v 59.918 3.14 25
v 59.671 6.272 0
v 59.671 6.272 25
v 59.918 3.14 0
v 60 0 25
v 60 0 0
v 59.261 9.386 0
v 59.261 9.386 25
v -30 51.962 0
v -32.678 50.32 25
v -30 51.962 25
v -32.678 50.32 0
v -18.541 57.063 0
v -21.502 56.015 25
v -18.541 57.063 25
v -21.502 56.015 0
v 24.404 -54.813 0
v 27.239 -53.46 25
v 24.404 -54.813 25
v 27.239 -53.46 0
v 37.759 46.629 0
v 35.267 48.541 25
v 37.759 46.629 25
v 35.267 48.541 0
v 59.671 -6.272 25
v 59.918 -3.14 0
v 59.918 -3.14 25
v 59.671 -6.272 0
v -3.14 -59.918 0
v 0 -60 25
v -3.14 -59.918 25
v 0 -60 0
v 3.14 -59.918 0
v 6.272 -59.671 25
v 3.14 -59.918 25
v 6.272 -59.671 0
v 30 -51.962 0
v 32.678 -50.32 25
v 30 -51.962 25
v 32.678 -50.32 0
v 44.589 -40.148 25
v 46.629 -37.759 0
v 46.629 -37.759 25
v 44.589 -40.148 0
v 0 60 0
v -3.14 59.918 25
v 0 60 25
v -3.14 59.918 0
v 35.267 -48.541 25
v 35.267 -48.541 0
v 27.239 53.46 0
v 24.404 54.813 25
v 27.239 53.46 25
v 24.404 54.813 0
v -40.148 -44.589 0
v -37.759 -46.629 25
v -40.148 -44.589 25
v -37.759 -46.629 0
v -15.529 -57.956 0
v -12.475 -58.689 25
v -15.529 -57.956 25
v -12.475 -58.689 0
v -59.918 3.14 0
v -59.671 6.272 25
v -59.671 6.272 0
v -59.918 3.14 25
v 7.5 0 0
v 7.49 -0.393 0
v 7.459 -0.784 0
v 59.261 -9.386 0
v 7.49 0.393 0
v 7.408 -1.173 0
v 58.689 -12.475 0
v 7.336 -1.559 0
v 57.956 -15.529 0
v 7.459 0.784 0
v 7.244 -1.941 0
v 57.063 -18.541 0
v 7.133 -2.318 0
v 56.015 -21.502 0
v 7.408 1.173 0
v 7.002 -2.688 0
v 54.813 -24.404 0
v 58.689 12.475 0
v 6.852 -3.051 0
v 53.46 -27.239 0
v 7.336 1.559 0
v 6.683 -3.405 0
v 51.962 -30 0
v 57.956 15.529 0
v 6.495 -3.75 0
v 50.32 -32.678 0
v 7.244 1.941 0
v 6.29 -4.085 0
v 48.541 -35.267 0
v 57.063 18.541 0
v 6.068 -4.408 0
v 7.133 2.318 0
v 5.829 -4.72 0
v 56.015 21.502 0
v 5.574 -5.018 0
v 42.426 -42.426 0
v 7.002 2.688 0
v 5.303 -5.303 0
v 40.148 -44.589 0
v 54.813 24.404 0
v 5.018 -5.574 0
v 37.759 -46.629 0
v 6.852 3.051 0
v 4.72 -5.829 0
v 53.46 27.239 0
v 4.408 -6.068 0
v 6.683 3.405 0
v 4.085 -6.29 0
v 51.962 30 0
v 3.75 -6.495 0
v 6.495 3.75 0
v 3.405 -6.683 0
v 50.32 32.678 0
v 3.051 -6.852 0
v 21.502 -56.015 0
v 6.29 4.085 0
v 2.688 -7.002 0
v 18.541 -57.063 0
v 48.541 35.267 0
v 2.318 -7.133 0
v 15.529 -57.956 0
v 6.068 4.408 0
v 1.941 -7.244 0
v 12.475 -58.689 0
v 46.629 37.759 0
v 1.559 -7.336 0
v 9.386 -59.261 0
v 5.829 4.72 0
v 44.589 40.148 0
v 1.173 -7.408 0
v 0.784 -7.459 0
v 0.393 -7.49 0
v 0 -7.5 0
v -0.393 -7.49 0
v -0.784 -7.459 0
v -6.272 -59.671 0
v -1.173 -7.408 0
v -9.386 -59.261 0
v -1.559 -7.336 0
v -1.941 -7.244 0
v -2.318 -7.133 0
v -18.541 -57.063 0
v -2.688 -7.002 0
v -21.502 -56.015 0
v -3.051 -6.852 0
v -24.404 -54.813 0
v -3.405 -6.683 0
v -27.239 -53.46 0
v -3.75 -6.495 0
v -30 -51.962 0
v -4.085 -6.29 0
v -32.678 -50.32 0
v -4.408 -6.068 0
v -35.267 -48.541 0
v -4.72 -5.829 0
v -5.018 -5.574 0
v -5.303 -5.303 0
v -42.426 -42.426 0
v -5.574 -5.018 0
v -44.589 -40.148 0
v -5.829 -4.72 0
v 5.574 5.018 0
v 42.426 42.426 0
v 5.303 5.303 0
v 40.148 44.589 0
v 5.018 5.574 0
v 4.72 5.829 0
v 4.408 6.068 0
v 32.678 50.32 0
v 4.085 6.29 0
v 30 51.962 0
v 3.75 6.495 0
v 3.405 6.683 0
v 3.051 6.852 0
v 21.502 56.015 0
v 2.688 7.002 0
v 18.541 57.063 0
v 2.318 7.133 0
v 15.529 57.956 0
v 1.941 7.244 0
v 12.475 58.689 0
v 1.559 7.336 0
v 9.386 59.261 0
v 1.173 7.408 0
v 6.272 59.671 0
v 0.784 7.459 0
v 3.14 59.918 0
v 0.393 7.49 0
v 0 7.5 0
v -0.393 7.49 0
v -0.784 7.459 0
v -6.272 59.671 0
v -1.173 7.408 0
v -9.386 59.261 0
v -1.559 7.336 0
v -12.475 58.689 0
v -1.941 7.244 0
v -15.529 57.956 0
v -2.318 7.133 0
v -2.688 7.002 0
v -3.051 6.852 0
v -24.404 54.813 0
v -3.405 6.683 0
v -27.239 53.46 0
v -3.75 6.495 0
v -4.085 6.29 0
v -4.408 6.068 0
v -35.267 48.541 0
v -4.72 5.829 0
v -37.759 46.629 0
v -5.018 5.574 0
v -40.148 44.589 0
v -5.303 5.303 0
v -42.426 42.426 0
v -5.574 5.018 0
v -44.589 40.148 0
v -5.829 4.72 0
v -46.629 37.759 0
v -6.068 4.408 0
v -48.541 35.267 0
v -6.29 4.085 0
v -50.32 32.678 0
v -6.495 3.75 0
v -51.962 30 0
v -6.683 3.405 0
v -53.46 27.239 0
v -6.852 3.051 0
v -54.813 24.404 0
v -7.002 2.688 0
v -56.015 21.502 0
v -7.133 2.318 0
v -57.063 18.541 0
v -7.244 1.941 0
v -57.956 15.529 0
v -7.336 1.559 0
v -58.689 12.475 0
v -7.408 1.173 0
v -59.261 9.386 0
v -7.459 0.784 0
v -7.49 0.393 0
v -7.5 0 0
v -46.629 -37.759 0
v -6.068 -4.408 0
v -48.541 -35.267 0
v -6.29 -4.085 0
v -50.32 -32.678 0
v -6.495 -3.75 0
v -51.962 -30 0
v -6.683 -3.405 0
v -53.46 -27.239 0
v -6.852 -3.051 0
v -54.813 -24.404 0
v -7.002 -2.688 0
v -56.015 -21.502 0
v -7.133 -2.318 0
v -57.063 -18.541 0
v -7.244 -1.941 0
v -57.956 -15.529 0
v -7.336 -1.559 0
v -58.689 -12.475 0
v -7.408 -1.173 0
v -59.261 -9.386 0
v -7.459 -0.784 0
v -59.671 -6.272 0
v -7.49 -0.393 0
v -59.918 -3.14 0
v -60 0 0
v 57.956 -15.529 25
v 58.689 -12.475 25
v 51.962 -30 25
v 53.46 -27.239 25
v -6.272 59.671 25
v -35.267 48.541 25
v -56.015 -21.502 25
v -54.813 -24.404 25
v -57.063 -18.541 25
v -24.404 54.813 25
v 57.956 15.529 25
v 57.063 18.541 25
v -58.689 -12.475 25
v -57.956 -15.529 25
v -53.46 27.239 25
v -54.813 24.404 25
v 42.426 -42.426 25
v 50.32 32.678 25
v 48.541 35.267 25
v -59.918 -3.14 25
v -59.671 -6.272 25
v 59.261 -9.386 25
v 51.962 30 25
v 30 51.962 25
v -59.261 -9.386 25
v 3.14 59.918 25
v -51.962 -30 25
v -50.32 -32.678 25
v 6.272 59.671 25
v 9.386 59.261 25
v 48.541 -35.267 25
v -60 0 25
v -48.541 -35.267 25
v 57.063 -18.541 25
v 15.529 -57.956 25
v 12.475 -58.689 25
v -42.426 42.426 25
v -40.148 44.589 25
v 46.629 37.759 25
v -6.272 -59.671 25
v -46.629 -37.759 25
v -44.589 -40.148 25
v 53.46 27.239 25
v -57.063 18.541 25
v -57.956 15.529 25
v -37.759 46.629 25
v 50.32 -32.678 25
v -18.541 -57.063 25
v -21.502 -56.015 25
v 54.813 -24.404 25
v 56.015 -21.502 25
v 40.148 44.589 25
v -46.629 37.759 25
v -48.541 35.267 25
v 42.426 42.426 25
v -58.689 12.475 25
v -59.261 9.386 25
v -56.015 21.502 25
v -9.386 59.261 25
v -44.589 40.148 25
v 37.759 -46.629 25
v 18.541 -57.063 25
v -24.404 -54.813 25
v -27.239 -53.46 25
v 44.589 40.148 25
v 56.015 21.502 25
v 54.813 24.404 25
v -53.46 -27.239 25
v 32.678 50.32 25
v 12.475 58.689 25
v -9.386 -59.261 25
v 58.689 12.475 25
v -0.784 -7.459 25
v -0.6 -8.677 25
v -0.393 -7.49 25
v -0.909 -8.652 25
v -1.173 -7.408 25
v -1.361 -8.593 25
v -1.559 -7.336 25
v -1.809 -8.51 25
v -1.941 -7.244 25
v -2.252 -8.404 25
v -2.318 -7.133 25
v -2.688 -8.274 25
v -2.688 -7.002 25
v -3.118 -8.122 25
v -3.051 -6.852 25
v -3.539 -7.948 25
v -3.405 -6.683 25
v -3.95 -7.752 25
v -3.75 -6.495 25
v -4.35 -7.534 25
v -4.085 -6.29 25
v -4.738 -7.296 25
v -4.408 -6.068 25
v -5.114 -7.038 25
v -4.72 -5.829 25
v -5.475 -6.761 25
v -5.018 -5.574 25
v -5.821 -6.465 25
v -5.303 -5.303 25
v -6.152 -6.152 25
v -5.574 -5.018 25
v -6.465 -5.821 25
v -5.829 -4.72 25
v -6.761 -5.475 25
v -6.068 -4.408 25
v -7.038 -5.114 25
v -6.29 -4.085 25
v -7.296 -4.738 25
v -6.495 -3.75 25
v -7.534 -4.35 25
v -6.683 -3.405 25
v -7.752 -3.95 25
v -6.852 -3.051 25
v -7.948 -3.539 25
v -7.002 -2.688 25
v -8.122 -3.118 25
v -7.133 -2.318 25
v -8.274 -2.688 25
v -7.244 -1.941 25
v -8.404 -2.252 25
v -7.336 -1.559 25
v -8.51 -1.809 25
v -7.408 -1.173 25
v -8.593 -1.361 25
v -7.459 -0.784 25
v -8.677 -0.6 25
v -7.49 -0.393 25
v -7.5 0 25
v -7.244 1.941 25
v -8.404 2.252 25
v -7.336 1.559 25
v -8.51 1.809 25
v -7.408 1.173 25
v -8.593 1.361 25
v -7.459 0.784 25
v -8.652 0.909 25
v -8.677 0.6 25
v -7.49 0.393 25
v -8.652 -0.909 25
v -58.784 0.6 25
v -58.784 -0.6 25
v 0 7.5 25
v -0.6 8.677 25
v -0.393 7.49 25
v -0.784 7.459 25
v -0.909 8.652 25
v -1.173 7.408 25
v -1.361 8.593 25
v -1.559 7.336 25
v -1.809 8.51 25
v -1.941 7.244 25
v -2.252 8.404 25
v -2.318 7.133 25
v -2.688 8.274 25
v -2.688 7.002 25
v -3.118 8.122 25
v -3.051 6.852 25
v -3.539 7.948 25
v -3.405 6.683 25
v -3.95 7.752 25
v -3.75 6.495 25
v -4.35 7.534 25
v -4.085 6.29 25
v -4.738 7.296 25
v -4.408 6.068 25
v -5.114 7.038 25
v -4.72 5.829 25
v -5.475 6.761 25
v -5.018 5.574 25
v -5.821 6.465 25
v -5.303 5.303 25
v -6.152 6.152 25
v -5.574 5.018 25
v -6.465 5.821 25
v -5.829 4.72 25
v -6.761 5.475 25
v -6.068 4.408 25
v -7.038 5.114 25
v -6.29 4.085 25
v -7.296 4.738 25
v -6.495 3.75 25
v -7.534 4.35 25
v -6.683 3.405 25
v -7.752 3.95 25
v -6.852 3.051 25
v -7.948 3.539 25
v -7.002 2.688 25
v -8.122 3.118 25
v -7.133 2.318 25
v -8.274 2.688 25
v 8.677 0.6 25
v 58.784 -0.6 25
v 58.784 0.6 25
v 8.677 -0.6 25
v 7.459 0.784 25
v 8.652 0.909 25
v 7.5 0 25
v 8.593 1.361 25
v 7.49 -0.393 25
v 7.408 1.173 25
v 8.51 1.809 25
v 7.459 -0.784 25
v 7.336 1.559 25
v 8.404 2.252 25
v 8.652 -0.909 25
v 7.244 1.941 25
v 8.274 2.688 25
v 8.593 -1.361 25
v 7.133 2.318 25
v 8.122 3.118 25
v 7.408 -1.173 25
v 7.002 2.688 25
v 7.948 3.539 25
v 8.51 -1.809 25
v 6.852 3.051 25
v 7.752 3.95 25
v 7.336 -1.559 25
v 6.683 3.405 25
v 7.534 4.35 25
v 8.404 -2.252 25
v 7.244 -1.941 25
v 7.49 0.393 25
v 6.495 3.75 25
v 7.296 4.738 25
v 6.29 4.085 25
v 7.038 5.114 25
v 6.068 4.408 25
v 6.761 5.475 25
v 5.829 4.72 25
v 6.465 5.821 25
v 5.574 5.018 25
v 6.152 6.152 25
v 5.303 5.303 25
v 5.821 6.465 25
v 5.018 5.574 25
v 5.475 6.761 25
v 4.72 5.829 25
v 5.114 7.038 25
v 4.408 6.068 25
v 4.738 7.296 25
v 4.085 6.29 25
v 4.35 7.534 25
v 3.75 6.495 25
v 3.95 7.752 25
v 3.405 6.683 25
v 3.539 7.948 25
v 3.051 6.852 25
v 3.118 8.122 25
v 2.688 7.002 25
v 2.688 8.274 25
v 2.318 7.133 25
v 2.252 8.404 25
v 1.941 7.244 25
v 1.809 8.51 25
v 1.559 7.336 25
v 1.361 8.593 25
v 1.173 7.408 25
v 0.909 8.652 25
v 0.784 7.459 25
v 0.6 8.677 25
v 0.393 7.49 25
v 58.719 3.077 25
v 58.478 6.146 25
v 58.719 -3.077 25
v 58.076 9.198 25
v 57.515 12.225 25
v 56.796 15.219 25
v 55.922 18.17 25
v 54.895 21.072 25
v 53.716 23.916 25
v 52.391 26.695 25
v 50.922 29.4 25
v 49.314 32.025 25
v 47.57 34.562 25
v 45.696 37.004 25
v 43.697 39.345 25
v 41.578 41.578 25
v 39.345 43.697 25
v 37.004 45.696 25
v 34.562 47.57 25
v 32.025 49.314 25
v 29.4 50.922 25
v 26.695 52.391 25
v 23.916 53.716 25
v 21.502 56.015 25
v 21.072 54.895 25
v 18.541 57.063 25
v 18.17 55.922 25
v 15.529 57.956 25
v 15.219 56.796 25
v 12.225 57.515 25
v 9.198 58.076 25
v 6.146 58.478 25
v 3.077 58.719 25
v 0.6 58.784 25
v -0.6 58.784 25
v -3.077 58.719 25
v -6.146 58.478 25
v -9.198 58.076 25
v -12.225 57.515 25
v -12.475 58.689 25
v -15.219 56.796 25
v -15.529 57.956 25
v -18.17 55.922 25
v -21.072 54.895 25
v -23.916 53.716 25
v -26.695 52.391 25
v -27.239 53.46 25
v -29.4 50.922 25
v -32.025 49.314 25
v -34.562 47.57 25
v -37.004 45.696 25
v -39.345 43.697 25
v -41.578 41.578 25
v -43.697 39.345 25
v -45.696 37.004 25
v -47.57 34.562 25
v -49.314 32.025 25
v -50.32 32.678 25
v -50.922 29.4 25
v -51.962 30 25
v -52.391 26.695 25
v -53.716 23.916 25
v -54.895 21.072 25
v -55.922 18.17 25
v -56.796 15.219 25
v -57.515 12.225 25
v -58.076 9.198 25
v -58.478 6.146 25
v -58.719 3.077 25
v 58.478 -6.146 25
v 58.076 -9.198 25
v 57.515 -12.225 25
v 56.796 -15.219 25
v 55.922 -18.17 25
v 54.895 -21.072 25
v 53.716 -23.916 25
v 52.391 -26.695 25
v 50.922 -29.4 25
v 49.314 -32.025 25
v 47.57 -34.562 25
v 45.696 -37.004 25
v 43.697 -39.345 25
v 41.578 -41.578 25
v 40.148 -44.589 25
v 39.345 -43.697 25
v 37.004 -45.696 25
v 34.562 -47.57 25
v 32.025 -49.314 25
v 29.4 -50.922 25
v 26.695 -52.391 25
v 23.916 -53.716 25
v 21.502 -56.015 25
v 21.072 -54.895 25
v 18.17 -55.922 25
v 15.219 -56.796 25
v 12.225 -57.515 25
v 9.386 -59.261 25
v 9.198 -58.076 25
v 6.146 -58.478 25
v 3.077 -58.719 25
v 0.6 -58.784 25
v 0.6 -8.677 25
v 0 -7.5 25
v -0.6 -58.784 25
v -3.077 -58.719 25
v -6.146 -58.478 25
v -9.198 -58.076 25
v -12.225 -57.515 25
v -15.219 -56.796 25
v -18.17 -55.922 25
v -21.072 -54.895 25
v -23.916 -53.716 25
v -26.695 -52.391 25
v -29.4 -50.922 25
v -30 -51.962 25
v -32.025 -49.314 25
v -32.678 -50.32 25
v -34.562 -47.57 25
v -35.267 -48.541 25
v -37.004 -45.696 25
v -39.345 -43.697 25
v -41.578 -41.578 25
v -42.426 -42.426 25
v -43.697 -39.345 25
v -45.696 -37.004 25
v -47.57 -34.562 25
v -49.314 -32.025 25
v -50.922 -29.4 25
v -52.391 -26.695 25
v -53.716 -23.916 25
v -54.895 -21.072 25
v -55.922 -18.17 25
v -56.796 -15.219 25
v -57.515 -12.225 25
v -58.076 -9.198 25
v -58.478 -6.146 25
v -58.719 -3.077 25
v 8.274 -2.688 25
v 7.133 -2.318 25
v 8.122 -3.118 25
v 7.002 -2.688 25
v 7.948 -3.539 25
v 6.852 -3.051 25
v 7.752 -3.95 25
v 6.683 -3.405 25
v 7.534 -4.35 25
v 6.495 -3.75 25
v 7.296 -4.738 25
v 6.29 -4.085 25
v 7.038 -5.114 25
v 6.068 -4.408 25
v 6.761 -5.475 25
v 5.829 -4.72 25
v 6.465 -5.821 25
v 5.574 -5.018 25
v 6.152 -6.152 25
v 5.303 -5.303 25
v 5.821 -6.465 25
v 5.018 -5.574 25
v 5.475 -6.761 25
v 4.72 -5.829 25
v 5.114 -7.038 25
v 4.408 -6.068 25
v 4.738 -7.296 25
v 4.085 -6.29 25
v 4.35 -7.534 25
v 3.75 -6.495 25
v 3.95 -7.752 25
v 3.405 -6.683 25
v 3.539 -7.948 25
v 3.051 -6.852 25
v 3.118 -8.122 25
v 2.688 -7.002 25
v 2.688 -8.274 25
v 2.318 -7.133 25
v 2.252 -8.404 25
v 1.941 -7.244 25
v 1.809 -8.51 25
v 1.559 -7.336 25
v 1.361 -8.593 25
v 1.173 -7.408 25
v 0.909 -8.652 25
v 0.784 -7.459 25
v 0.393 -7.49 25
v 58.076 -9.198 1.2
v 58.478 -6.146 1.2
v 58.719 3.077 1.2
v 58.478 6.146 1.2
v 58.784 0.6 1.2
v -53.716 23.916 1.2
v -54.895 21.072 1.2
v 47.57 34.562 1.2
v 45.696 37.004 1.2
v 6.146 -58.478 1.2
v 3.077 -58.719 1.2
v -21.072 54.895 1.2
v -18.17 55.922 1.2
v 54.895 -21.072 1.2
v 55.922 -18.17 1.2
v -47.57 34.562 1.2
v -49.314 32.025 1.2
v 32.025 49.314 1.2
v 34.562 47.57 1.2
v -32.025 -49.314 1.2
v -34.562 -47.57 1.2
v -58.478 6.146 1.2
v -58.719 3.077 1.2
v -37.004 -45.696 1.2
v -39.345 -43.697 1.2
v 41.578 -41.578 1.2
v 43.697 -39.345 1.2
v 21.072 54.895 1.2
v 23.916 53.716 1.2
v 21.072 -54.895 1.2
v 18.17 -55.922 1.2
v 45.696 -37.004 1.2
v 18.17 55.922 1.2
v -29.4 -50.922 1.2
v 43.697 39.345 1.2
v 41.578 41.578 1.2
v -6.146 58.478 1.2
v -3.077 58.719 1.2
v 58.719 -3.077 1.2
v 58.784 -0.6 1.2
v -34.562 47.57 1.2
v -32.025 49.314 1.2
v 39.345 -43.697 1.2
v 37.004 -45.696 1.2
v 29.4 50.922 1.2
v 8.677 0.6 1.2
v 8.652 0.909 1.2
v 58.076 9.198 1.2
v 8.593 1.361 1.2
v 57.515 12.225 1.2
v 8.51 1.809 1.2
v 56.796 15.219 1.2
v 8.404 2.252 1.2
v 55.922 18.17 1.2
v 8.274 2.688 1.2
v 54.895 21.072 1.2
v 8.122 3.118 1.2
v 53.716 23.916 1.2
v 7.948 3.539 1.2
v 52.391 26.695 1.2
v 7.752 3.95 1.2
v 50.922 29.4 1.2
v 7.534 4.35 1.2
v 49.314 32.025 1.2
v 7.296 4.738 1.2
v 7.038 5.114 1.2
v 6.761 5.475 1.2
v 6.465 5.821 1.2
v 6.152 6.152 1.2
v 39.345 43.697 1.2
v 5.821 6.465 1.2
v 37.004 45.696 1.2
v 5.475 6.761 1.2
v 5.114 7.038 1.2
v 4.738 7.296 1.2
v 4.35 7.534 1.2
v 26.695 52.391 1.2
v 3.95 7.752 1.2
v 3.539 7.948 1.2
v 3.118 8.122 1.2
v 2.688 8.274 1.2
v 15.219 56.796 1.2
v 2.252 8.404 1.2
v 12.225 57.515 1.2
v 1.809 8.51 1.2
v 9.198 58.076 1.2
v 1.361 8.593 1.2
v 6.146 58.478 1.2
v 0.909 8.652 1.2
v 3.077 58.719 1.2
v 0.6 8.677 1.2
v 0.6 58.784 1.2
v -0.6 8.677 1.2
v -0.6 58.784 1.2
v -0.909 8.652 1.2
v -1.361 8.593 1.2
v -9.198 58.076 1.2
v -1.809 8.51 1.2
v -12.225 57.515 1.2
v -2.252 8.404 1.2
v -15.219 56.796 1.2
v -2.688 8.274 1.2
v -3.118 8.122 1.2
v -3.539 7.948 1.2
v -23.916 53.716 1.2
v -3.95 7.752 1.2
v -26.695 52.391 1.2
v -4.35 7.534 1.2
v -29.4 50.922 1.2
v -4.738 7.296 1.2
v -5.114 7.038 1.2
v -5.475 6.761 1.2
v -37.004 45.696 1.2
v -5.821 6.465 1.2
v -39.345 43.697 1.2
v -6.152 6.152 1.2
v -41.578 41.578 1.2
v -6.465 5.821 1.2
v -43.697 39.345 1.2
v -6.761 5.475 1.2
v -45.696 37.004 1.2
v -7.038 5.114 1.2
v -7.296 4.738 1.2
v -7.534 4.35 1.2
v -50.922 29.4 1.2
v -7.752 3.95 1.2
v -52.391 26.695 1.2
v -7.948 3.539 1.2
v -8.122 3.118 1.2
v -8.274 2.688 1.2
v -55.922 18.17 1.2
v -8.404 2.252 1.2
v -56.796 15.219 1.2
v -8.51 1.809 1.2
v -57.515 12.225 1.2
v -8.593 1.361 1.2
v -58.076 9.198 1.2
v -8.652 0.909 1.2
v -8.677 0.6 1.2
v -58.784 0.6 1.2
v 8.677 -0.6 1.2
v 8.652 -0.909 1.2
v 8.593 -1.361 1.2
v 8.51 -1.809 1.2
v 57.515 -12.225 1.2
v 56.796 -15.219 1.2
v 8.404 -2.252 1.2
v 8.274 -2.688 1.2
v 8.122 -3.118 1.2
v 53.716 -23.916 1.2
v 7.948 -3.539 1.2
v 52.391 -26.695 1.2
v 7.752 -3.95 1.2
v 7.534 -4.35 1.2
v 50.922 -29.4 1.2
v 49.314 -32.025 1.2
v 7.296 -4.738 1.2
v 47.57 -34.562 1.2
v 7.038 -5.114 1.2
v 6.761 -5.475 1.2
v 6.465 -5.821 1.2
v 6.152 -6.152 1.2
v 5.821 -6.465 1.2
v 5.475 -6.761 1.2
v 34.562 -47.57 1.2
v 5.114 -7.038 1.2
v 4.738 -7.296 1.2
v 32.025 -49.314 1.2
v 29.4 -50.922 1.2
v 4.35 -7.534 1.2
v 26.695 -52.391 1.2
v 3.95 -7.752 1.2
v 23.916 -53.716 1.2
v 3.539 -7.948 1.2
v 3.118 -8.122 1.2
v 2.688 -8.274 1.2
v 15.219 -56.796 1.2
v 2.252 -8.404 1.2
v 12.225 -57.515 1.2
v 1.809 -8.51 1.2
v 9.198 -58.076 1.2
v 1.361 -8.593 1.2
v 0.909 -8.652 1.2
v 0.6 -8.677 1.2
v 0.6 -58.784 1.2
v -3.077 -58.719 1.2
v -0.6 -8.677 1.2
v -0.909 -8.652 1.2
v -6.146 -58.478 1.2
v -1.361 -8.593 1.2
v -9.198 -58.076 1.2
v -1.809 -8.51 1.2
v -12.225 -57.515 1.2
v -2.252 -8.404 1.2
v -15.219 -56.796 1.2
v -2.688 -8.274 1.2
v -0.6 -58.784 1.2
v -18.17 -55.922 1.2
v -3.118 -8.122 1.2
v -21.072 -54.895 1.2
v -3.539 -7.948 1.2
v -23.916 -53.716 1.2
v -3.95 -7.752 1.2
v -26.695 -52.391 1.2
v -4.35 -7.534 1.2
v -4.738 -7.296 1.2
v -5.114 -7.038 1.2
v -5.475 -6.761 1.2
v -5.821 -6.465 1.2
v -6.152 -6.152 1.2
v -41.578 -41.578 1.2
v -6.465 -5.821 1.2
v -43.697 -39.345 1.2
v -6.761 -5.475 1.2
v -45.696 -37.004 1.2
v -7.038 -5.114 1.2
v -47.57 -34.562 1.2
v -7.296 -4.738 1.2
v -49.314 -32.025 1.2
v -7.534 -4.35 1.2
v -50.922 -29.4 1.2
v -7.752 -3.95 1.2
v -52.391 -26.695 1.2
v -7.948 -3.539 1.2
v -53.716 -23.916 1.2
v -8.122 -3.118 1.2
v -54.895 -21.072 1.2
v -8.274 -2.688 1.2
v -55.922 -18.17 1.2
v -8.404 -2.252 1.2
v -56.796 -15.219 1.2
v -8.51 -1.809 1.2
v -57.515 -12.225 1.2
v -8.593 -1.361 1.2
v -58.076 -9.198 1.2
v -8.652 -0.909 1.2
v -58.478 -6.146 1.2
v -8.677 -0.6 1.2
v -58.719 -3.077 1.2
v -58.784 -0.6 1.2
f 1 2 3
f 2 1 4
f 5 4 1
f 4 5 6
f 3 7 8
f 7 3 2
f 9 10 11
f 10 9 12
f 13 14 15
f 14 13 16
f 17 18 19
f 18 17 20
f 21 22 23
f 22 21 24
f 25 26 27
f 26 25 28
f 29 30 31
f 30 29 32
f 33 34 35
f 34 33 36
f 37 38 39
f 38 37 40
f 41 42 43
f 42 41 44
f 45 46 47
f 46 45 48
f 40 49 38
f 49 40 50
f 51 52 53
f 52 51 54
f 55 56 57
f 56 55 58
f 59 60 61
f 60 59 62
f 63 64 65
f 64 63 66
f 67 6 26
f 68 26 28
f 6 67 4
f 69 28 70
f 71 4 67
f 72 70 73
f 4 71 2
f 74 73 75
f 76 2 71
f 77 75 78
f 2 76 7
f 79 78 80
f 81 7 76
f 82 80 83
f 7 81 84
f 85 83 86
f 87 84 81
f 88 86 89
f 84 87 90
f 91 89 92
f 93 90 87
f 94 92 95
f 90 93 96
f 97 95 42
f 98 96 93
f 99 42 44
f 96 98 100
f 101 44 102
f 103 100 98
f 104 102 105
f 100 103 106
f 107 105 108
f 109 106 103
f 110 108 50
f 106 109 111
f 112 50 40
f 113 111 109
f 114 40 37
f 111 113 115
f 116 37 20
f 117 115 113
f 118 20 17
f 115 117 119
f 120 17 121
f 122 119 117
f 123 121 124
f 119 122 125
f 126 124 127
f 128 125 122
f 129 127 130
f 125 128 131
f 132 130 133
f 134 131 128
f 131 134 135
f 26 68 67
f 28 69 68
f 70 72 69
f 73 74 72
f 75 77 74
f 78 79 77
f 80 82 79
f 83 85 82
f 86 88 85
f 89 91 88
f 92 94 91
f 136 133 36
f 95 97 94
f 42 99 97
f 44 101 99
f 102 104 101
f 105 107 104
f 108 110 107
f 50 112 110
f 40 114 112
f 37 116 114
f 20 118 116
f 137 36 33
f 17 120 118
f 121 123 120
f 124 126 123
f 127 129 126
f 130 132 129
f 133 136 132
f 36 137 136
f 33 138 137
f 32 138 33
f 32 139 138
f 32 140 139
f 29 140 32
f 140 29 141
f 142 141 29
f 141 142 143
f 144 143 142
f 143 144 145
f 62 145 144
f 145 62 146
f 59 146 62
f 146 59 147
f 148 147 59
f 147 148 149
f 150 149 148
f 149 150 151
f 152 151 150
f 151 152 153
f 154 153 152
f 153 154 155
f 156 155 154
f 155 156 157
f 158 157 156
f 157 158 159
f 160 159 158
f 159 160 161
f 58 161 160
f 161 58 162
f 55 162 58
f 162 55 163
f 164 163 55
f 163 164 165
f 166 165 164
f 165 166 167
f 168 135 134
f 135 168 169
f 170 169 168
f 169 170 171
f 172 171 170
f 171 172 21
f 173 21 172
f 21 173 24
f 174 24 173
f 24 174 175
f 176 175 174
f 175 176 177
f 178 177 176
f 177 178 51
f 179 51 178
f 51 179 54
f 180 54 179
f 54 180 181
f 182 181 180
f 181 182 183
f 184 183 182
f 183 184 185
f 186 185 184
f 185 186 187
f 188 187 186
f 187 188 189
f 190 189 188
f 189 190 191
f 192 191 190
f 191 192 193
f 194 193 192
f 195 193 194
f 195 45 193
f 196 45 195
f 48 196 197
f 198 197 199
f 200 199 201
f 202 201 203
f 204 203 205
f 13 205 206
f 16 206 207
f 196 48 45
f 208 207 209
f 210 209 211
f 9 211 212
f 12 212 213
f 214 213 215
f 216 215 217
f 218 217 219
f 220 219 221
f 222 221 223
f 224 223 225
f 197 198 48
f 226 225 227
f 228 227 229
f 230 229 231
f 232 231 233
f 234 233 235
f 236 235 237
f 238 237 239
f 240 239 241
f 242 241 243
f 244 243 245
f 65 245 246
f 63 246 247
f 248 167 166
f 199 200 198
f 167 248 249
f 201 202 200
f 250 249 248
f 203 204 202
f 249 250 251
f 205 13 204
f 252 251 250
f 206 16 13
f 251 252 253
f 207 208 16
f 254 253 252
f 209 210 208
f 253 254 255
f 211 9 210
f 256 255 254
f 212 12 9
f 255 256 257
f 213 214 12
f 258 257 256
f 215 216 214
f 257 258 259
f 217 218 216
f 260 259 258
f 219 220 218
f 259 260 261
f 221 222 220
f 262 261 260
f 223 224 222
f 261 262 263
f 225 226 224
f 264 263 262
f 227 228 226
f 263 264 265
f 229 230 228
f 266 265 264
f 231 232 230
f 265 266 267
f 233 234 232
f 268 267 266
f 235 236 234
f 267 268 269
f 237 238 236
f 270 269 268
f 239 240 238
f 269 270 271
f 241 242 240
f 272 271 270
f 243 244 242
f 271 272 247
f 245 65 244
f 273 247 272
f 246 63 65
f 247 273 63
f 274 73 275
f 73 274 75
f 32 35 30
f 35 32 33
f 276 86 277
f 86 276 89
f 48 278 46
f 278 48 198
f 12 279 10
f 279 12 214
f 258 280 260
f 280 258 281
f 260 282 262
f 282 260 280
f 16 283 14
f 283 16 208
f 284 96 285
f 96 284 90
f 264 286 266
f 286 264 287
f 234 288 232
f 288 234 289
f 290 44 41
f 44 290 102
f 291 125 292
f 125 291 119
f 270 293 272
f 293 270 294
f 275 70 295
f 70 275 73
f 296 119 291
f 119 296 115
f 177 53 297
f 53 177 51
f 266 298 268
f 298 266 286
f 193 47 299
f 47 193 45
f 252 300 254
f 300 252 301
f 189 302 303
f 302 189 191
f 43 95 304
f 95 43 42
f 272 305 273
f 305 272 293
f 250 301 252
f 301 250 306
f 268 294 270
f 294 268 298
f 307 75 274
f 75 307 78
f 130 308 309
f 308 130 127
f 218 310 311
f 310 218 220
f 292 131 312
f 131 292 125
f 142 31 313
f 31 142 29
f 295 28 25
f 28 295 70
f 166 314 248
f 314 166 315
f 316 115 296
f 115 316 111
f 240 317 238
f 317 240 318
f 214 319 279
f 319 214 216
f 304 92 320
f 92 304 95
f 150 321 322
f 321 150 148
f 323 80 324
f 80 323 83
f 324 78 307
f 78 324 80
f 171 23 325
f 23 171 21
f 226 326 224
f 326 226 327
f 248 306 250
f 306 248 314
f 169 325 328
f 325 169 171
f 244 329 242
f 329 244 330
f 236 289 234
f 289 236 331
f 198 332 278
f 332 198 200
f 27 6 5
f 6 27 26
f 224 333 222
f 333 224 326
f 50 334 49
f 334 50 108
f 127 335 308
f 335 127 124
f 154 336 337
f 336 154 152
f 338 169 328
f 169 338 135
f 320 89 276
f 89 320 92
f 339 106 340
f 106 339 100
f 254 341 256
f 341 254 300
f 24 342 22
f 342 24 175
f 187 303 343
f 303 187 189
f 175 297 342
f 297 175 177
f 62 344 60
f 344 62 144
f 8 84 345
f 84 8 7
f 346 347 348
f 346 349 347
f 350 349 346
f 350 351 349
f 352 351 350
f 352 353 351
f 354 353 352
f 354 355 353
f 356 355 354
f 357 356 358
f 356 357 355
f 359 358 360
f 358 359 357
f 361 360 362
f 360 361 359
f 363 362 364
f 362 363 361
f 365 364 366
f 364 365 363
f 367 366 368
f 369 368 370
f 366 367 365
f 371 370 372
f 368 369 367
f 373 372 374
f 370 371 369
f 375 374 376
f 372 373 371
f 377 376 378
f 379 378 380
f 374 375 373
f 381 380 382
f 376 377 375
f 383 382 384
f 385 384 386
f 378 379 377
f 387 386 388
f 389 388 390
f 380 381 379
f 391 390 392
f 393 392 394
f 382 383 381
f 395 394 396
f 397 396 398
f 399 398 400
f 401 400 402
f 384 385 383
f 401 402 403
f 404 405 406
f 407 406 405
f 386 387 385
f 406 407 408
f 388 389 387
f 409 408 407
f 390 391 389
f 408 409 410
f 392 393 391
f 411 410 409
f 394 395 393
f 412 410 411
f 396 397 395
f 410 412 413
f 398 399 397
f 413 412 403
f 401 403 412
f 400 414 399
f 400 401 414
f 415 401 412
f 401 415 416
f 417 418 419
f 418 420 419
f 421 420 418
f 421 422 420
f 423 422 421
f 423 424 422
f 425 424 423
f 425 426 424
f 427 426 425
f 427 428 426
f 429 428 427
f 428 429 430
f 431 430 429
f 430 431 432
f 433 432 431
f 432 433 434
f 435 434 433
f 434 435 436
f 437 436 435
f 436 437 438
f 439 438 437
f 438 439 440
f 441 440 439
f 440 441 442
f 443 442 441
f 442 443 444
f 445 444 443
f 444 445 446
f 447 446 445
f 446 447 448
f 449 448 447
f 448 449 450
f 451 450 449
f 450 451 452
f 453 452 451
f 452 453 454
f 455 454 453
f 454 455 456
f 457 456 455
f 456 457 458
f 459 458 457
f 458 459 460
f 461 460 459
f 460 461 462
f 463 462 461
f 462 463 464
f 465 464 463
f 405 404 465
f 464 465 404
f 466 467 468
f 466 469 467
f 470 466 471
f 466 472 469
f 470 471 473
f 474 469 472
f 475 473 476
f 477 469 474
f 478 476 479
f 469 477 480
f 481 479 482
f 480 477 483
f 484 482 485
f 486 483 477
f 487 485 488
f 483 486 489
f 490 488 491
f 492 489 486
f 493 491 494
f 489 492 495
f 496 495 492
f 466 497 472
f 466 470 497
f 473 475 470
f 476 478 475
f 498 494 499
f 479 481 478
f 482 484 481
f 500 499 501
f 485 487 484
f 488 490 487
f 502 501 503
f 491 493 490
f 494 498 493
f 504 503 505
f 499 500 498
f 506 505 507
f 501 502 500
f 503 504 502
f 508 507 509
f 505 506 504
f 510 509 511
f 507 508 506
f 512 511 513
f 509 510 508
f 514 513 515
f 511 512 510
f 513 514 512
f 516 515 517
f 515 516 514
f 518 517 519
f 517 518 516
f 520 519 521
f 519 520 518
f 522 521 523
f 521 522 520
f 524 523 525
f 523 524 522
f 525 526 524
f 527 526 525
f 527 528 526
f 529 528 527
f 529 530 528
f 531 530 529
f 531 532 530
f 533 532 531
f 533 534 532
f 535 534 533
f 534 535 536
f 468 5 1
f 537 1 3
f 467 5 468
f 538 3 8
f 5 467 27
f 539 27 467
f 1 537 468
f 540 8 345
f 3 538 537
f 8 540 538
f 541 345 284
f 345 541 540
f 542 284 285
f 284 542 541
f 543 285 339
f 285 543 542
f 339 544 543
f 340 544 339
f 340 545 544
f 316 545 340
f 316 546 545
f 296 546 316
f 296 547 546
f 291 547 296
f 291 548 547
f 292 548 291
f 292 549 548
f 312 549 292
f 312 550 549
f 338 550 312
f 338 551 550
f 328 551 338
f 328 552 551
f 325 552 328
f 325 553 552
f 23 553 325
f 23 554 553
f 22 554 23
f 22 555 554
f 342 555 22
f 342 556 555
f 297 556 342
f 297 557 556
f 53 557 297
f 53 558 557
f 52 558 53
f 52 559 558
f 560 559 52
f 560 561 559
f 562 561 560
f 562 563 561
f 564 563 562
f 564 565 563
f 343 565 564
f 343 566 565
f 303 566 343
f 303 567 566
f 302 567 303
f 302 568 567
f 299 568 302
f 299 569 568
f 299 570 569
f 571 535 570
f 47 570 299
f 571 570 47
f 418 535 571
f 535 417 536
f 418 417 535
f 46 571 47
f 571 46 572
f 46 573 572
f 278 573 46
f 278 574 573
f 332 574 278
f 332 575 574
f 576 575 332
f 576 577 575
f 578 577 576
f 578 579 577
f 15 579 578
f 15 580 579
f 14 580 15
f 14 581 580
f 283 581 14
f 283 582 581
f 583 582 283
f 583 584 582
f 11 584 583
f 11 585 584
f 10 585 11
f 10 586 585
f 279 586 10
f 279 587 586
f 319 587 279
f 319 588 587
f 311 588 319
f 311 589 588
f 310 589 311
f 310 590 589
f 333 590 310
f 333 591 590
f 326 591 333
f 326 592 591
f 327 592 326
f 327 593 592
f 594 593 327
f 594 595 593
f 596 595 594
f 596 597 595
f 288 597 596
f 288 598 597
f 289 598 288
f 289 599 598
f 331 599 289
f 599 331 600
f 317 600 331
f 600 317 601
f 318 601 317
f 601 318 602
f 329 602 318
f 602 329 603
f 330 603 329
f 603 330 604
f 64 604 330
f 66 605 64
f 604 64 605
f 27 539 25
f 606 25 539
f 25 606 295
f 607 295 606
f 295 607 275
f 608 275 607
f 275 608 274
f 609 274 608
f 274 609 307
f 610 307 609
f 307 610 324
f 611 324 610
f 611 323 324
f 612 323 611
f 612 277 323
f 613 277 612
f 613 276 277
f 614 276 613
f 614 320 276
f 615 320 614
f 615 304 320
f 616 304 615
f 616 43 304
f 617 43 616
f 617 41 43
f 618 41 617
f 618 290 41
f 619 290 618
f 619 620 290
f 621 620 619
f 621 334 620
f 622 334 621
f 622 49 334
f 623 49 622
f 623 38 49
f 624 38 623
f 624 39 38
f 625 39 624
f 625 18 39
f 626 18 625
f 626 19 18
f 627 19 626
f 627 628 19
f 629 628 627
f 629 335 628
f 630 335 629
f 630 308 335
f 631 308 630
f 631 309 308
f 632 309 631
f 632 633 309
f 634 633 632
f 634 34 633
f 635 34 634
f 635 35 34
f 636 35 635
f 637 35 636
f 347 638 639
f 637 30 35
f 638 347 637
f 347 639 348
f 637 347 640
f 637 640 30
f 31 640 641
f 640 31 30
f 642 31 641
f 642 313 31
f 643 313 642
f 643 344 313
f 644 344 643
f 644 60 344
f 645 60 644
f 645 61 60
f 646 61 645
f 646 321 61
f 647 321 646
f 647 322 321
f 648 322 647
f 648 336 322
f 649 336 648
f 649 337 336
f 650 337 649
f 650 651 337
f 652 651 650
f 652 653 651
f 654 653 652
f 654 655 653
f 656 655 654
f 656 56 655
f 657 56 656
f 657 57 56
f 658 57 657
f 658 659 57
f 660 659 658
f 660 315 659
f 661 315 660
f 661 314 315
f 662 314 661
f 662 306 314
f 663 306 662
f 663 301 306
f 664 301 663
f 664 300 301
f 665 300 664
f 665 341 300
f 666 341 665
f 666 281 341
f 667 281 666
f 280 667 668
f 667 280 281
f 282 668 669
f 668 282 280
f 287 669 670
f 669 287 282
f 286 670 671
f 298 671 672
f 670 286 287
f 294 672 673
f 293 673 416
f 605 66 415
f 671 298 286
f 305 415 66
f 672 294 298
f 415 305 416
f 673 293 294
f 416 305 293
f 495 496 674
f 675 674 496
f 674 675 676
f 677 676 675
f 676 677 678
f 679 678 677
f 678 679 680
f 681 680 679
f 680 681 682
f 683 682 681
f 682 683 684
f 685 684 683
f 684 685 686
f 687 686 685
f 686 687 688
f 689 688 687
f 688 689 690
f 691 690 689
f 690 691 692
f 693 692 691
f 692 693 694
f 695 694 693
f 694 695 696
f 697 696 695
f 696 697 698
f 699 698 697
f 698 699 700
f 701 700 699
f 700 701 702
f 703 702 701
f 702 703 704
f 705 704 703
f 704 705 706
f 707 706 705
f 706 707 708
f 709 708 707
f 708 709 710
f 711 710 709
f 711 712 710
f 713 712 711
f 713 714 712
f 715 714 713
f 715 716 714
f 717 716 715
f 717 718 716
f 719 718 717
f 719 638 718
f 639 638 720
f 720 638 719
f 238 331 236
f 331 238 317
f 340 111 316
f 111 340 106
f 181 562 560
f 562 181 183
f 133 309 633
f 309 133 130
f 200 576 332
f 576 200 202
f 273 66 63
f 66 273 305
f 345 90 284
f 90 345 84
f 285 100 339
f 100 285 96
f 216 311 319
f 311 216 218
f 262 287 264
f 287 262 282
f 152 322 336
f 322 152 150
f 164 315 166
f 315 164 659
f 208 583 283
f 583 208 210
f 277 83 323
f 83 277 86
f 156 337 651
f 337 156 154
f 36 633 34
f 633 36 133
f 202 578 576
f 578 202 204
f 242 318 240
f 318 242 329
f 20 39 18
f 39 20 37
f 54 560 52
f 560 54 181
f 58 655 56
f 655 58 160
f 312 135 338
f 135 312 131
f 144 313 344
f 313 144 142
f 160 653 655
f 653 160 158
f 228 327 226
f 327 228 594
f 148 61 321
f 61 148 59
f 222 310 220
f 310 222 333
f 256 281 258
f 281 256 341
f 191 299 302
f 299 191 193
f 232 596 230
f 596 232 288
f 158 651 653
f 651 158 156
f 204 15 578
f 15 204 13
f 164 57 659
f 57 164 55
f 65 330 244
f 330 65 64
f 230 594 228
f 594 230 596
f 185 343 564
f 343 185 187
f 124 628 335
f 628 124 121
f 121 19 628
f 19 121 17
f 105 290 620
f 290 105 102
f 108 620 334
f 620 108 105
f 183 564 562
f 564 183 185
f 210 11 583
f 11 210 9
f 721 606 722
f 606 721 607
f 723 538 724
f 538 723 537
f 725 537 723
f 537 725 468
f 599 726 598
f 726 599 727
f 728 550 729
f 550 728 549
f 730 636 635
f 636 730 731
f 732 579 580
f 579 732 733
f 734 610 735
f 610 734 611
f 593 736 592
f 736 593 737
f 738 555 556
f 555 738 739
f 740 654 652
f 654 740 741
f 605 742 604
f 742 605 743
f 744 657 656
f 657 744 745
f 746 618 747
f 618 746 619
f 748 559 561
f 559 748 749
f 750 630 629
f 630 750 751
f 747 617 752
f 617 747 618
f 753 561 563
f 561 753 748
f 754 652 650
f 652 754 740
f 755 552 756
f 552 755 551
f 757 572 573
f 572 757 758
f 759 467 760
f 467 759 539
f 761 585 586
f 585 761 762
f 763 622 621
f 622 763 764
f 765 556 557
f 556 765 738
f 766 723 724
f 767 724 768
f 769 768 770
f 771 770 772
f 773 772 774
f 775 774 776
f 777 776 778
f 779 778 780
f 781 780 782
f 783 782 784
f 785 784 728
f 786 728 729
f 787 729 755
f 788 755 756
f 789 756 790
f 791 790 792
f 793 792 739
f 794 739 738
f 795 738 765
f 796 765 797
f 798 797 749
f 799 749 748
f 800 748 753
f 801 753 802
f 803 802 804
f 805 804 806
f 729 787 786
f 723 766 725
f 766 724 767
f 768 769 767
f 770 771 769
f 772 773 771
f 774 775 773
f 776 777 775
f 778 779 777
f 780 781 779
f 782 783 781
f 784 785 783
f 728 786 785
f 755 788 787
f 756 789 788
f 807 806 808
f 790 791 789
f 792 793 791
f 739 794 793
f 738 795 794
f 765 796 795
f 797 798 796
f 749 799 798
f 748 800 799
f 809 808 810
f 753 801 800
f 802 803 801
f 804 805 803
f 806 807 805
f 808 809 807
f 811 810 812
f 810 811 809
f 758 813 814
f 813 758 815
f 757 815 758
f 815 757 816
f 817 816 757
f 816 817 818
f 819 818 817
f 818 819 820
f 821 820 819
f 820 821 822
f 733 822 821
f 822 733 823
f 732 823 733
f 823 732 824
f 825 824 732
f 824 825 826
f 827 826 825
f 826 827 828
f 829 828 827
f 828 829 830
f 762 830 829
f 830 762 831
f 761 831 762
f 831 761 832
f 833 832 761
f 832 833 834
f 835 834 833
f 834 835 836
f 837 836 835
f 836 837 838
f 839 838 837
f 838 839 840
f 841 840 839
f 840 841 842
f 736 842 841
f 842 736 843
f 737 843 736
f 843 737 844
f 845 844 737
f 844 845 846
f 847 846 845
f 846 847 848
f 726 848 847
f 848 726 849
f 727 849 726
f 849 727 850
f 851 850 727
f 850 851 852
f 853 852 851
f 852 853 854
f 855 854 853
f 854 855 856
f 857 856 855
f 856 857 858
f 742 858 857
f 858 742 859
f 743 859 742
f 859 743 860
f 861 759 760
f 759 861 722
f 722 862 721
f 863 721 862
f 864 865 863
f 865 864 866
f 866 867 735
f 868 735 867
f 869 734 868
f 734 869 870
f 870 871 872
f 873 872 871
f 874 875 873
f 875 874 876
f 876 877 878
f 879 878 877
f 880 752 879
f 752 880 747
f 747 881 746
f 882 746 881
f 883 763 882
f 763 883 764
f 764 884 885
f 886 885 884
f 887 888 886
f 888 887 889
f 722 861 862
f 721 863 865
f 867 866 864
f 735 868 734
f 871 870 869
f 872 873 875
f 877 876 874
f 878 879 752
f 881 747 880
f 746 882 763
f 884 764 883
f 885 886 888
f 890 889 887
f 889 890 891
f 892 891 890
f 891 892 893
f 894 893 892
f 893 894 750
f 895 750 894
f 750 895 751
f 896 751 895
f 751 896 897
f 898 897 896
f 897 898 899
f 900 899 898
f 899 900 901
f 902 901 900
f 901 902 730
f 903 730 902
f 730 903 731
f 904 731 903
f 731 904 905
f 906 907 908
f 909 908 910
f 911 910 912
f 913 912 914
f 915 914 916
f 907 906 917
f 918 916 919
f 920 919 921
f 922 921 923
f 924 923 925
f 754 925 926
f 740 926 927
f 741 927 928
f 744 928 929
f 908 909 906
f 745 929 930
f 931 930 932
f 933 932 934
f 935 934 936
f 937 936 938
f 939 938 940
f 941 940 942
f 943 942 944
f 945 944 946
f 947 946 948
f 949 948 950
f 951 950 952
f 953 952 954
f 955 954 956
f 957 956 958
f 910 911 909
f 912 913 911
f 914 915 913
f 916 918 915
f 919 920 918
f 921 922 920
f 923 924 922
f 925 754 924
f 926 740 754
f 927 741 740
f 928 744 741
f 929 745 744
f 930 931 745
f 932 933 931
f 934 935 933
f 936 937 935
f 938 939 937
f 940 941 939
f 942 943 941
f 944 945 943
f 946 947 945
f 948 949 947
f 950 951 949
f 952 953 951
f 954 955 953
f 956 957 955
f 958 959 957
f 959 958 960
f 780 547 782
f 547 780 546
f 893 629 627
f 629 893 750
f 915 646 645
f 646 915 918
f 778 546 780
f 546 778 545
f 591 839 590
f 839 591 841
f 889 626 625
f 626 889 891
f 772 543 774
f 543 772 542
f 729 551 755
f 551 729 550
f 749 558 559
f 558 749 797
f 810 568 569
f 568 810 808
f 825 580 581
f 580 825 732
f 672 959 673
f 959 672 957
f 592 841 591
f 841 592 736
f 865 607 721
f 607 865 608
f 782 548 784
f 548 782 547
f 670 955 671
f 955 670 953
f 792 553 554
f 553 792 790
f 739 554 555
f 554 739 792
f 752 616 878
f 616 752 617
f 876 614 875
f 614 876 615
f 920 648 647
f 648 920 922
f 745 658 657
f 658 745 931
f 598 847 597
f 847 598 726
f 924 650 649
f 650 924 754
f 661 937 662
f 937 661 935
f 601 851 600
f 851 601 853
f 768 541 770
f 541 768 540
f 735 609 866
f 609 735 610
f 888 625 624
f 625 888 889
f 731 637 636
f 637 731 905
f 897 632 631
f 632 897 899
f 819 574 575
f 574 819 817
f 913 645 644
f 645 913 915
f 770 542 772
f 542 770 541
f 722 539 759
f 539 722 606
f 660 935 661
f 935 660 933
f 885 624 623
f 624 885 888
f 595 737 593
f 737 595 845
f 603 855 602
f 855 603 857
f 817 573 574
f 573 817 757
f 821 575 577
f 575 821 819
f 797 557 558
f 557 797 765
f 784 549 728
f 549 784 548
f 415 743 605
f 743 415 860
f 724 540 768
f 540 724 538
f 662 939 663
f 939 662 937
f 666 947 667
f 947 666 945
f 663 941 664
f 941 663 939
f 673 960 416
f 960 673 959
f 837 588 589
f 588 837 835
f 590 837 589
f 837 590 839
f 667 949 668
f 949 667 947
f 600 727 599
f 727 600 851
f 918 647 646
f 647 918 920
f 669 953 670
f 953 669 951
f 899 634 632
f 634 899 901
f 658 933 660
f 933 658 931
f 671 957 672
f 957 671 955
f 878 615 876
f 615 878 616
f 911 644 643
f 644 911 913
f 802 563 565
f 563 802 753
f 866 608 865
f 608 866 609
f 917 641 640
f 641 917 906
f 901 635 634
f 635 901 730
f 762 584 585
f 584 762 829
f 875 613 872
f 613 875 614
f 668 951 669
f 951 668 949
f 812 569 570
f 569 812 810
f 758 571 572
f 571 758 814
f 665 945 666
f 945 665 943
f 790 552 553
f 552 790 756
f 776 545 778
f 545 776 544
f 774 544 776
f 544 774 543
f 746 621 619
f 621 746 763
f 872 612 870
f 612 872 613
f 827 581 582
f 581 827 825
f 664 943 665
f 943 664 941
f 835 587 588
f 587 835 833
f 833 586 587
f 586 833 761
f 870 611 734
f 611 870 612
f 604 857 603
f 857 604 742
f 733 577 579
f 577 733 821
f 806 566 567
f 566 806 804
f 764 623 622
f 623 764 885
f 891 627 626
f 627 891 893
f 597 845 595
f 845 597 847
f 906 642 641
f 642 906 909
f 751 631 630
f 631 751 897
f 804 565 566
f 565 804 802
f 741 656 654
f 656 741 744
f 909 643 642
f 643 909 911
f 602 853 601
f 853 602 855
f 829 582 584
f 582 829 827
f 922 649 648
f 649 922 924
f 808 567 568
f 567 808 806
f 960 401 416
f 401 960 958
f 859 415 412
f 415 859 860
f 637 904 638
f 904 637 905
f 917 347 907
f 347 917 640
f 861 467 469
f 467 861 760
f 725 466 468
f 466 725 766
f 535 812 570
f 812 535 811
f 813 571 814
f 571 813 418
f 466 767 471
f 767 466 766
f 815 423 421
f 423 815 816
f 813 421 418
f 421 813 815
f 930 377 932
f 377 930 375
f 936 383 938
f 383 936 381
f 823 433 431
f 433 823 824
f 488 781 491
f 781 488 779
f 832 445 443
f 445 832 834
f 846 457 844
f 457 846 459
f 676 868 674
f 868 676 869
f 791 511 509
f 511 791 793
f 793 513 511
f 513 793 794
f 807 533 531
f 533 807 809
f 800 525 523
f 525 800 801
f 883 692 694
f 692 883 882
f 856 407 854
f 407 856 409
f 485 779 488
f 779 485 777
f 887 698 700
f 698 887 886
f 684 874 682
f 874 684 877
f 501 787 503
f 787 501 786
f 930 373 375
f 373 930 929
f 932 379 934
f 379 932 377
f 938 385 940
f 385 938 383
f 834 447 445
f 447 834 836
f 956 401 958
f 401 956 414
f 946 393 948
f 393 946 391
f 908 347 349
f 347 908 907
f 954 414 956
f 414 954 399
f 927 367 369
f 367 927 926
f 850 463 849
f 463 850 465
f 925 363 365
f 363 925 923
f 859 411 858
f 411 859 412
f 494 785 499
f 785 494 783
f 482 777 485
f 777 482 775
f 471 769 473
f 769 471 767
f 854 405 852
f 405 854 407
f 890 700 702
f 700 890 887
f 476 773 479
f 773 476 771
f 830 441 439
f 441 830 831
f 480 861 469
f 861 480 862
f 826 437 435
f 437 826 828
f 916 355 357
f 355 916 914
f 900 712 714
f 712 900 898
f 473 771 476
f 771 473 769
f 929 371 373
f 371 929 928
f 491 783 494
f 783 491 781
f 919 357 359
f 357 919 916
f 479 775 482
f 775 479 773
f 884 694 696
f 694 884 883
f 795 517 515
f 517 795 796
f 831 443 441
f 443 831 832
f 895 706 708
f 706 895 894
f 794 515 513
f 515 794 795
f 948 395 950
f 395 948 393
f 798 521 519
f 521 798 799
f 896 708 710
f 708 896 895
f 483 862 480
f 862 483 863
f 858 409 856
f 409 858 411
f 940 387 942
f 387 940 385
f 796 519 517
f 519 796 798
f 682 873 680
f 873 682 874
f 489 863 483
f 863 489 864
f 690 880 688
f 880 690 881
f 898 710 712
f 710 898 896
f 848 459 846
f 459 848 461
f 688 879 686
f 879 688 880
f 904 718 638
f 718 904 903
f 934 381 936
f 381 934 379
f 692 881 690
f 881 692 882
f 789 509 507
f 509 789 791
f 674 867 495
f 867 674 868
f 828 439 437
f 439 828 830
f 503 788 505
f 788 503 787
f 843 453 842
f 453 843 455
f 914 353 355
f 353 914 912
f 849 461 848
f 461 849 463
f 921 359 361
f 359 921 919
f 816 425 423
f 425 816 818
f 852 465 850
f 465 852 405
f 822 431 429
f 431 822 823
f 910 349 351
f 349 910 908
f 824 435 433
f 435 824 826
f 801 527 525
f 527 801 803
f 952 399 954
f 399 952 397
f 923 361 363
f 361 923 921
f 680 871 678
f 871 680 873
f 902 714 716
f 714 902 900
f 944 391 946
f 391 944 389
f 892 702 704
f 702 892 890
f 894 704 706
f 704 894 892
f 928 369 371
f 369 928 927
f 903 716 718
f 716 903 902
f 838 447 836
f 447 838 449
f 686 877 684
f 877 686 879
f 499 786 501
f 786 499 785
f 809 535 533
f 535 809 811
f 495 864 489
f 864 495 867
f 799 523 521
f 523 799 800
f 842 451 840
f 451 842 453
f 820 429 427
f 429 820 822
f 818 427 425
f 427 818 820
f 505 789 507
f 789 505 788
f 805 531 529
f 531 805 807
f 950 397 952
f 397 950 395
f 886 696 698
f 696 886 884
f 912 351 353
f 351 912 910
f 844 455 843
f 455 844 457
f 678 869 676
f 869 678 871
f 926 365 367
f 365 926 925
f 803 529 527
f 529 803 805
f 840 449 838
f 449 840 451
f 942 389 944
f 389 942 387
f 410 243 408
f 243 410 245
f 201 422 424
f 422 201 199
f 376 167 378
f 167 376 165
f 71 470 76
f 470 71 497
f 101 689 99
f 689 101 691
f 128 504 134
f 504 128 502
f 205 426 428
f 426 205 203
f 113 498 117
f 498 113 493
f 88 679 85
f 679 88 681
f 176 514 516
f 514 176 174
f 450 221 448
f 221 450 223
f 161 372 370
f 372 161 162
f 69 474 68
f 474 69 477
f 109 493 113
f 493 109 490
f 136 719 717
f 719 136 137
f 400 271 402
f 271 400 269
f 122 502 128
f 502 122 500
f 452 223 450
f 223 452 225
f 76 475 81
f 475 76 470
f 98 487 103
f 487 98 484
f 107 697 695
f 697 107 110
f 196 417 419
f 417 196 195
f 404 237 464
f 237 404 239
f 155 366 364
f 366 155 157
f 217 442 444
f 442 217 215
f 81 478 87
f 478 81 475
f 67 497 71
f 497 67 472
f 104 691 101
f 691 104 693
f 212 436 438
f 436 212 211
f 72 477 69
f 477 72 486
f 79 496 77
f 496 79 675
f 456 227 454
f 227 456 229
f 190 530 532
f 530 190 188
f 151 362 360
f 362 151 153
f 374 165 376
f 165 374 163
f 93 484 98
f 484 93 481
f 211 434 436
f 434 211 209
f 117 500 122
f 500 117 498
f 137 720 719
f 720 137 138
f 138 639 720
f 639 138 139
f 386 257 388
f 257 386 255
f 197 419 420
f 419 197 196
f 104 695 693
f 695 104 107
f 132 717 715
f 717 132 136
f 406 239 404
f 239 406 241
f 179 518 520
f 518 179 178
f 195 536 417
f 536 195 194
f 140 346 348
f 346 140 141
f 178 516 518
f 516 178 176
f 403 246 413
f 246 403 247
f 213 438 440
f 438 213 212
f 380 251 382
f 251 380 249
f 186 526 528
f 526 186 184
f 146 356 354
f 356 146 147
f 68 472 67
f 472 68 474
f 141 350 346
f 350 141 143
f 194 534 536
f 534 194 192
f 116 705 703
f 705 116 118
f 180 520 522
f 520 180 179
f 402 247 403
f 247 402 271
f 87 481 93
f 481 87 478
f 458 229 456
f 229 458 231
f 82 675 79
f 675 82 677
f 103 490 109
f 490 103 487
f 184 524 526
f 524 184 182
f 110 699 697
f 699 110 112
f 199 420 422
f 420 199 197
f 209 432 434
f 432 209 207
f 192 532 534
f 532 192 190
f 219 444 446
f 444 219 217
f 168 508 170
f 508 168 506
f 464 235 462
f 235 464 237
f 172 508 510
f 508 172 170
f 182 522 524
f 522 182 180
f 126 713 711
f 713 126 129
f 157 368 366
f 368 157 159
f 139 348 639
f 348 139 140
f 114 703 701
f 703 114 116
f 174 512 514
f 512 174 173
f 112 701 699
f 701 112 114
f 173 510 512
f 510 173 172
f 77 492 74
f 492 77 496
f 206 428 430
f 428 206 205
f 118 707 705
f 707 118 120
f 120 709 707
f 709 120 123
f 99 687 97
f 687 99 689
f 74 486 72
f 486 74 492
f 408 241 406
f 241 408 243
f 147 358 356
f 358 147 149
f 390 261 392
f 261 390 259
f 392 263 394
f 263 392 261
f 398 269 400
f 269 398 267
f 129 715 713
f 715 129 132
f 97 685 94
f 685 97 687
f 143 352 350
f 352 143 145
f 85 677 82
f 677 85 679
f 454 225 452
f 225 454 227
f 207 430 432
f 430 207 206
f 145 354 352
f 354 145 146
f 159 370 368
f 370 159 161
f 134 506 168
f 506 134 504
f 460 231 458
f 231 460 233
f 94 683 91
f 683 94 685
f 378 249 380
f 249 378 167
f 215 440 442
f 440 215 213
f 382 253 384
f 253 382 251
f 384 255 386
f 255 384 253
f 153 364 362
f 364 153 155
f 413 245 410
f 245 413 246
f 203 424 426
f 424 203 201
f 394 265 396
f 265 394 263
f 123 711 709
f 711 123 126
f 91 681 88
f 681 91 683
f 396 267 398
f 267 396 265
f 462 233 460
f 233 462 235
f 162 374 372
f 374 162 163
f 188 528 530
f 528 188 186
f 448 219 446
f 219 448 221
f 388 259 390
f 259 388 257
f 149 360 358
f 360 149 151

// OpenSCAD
inner_radius = 7.5;
outer_radius = 60;
wall_width = 1.2;
height = 25;
dividers = 4;

$fn = 120;

module box(inner_radius, outer_radius, height, wall_width, dividers){
    difference(){
        intersection(){
            union(){
                difference()
                {
                    cylinder(h=height, r=outer_radius);
                    cylinder(h=height, r=inner_radius);
                    translate([0,0,wall_width]){
                        cylinder(h=(height - wall_width), r = outer_radius - wall_width);
                    }
                }
                cylinder(h=height, r=inner_radius + wall_width);
                for (d = [1 : dividers]){
                    rotate(d * 360 / dividers, [0, 0, 1]){
                        translate([-wall_width / 2,inner_radius,0]){
                            cube(size=[wall_width, outer_radius-inner_radius, height], center=false);
                        }
                    }
                }
            }
            cylinder(h=height, r=outer_radius);
            
        }
        cylinder(h=height, r=inner_radius);
    }
}

box (inner_radius, outer_radius, height, wall_width, dividers);
